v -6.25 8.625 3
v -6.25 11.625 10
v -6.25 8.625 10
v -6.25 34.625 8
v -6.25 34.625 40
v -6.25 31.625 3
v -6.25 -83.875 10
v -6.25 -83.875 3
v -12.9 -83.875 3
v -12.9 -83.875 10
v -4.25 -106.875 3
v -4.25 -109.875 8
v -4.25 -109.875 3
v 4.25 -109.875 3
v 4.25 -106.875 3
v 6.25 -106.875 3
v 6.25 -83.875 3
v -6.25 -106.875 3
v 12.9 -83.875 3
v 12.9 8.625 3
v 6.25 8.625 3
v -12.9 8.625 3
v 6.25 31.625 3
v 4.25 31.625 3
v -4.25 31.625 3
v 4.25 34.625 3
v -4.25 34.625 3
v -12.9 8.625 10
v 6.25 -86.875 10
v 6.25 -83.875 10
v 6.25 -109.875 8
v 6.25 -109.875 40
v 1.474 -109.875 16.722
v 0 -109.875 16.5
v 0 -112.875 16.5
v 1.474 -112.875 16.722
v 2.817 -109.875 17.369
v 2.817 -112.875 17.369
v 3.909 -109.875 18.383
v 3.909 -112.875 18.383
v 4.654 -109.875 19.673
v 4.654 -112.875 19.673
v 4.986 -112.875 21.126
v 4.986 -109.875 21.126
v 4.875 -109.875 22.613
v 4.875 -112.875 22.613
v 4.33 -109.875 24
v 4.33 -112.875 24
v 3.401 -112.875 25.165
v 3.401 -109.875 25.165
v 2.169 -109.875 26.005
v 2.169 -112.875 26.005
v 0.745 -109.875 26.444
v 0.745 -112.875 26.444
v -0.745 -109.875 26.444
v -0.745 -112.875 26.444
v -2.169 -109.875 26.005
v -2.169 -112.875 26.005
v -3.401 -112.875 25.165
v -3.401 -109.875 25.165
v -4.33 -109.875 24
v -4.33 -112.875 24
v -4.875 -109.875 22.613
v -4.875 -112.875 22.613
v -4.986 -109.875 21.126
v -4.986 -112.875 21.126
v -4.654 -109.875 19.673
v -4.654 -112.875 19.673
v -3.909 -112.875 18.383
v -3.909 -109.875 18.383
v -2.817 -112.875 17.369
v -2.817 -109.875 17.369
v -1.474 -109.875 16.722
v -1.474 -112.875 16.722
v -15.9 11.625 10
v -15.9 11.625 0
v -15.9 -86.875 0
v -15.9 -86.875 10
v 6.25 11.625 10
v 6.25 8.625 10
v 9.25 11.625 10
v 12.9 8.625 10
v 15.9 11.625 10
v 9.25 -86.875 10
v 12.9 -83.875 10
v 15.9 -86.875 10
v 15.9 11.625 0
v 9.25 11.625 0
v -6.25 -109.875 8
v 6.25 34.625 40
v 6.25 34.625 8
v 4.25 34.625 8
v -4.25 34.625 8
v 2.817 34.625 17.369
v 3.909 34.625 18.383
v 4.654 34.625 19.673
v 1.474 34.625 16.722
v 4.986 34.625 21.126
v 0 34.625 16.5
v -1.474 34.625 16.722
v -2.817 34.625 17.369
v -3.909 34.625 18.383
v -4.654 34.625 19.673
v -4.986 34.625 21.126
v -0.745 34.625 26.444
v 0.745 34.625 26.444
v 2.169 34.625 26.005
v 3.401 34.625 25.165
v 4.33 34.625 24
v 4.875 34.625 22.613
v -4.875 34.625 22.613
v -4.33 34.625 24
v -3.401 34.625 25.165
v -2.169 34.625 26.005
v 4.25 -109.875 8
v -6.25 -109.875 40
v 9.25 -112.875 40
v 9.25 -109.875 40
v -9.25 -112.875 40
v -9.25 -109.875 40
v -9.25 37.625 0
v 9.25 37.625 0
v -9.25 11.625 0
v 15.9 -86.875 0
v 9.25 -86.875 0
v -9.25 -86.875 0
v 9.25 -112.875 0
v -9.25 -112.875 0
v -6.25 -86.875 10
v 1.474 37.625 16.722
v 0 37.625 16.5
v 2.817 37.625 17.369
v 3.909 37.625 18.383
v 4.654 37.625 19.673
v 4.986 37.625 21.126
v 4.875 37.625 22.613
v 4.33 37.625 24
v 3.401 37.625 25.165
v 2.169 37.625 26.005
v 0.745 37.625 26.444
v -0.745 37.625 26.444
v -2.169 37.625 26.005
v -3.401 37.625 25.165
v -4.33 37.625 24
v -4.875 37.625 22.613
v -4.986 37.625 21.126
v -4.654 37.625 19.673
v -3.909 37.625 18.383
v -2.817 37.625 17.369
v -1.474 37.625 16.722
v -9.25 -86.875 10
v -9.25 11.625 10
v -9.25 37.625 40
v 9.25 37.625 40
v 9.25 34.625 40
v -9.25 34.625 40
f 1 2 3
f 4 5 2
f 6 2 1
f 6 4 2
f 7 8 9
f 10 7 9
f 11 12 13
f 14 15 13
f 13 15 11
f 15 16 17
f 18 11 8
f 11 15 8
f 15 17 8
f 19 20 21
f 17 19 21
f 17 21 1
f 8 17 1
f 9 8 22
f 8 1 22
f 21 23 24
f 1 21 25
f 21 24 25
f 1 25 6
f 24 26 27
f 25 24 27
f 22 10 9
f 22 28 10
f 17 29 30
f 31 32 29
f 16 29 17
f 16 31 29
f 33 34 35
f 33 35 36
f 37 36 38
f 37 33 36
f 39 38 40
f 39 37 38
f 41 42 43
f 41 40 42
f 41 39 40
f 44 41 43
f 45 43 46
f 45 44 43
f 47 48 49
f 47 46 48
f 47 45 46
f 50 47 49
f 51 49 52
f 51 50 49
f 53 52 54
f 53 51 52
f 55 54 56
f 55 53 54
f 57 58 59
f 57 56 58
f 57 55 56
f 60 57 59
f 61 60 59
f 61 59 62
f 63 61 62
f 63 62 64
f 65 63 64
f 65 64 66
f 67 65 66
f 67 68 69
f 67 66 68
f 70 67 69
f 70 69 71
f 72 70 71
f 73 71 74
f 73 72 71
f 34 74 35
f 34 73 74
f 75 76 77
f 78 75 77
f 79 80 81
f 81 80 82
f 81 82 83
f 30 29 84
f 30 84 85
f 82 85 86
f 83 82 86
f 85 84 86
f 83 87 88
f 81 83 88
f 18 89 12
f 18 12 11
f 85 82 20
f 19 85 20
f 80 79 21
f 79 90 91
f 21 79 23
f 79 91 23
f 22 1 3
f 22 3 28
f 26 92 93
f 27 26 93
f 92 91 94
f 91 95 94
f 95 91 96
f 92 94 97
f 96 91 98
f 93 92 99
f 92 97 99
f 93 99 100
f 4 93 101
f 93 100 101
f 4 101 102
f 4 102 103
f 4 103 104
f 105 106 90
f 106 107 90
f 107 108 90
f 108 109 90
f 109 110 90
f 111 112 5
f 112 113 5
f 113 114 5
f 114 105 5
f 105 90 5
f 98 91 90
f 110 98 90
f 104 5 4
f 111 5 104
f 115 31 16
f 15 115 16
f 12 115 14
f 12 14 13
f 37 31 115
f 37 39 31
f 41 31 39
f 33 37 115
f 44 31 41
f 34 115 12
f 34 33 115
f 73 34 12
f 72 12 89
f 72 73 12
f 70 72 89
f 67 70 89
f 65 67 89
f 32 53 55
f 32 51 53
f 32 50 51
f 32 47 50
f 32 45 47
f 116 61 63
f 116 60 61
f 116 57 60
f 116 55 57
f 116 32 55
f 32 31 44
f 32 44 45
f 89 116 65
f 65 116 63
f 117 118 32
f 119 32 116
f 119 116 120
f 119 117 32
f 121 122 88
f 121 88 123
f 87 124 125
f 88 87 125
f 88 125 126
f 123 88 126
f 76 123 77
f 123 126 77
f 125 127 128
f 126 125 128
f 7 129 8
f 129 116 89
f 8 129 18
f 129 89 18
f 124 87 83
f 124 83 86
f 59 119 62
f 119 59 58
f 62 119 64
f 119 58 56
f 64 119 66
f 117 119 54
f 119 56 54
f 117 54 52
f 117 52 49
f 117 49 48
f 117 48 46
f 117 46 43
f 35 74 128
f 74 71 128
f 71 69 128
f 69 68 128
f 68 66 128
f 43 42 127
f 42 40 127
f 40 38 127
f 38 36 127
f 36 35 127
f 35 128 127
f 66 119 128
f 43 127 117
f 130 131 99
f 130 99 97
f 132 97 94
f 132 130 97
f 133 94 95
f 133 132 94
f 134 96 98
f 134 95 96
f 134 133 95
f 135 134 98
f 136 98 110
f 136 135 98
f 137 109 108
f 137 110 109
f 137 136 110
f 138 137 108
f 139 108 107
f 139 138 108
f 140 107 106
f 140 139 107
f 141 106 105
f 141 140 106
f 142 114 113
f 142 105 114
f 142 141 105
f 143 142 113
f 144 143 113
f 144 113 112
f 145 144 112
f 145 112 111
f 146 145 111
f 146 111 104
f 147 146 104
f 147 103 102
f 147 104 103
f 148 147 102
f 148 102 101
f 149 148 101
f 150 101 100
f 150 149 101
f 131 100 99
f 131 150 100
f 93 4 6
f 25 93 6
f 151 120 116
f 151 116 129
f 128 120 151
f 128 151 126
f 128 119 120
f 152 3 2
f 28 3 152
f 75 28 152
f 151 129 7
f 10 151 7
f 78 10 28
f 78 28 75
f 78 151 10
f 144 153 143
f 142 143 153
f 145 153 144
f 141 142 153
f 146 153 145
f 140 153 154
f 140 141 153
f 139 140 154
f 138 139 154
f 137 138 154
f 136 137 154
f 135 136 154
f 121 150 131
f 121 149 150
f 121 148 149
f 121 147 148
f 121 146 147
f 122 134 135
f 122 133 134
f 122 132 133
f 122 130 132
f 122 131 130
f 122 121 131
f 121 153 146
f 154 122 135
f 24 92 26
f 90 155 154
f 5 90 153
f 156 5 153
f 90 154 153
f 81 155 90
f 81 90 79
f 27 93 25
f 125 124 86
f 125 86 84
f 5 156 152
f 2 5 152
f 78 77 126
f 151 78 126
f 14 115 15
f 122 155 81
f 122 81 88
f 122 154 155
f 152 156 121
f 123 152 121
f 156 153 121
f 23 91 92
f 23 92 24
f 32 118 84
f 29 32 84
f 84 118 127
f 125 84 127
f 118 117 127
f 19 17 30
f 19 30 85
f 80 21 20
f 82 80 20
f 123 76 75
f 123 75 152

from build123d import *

# Parameters (mm, degrees)
BOSS_EXTRUDE11_DEPTH    = 40
SKETCH17_W              = 47.22521337
SKETCH17_H              = 85.181086333
CUT_EXTRUDE6_DEPTH      = 30
SHELL3_START            = -37.625
SHELL3_OUTLINE_W        = 25.8
SHELL3_OUTLINE_H        = 7
SHELL3_DEPTH            = 46.25
SHELL3_START_2          = 8.625
SHELL3_2_OUTLINE_W      = 12.5
SHELL3_2_OUTLINE_H      = 7
SHELL3_2_DEPTH          = 26
SKETCH18_W              = 54.471727392
SKETCH18_H              = 147.372956823
CUT_EXTRUDE7_DEPTH      = 308
BOSS_EXTRUDE12_DEPTH    = 3
BOSS_EXTRUDE13_DEPTH    = 2
CUT_EXTRUDE8_DEPTH      = 154.652399916
CUT_EXTRUDE8_DEPTH_BACK = 154.652399916
SKETCH21_R              = 5


# Read off the part's stored shape, not the designer's step: Shell3
with BuildPart() as part:
    # Sketch16 → Boss-Extrude11 (new body)
    with BuildSketch(Plane.XY):
        Polygon((-15.9, -37.625), (15.9, -37.625), (15.9, 11.625), (9.25, 11.625), (9.25, 37.625), (-9.25, 37.625), (-9.25, 11.625), (-15.9, 11.625), align=None)
    extrude(amount=BOSS_EXTRUDE11_DEPTH)

    # Sketch17 → Cut-Extrude6 (cut)
    with BuildSketch(Plane.XY.offset(40)):
        with Locations((3.242513711, -7.965543167)):
            Rectangle(SKETCH17_W, SKETCH17_H)
    extrude(amount=-CUT_EXTRUDE6_DEPTH, mode=Mode.SUBTRACT)

    # Shell3 outline → Shell3 (cut)
    with BuildSketch(Plane(origin=(0, 0, 0), x_dir=(1, 0, 0), z_dir=(0, 1, 0)).offset(SHELL3_START)):
        with Locations((0, -6.5)):
            Rectangle(SHELL3_OUTLINE_W, SHELL3_OUTLINE_H)
    extrude(amount=SHELL3_DEPTH, mode=Mode.SUBTRACT)

    # Shell3 2 outline → Shell3 2 (cut)
    with BuildSketch(Plane(origin=(0, 0, 0), x_dir=(1, 0, 0), z_dir=(0, 1, 0)).offset(SHELL3_START_2)):
        with Locations((0, -6.5)):
            Rectangle(SHELL3_2_OUTLINE_W, SHELL3_2_OUTLINE_H)
    extrude(amount=SHELL3_2_DEPTH, mode=Mode.SUBTRACT)

    # Sketch18 → Cut-Extrude7 (cut)
    with BuildSketch(Plane.XY.offset(40)):
        with Locations((-27.235863696, -36.061478412)):
            Rectangle(SKETCH18_W, SKETCH18_H)
    extrude(amount=-CUT_EXTRUDE7_DEPTH, mode=Mode.SUBTRACT)

    # Sketch19 → Boss-Extrude12 (add)
    with BuildSketch(Plane(origin=(9.25, 0, 0), x_dir=(0, 0, -1), z_dir=(1, 0, 0))):
        Polygon((-40, 34.625), (-10, 11.625), (-10, 34.625), align=None)
    extrude(amount=-BOSS_EXTRUDE12_DEPTH)

    # Sketch20 → Boss-Extrude13 (add)
    with BuildSketch(Plane.ZY.offset(-6.25)):
        Polygon((3, 34.625), (8, 34.625), (3, 31.625), align=None)
    extrude(amount=BOSS_EXTRUDE13_DEPTH)

    # Mirror3: part across plane


with BuildPart() as part_1:
    add(part.part)
    add(part.part.mirror(Plane(origin=(0, 37.625, -268), x_dir=(0, 0, 1), z_dir=(1, 0, 0))))

    # Mirror4: part across plane


with BuildPart() as part_2:
    add(part_1.part)
    add(part_1.part.mirror(Plane(origin=(-15.9, -37.625, 40), x_dir=(0, 0, 1), z_dir=(0, 1, 0))))

    # Sketch21 → Cut-Extrude8 (cut, two sides: drawn at the far end of the back side and taken through both)
    with BuildSketch(Plane.XZ.offset(-34.625).offset(-CUT_EXTRUDE8_DEPTH_BACK)):
        with Locations(Location((0, 21.5, 0), (0, 0, 270))):
            Circle(SKETCH21_R)
    extrude(amount=CUT_EXTRUDE8_DEPTH + CUT_EXTRUDE8_DEPTH_BACK, mode=Mode.SUBTRACT)


solid = part_2.part
